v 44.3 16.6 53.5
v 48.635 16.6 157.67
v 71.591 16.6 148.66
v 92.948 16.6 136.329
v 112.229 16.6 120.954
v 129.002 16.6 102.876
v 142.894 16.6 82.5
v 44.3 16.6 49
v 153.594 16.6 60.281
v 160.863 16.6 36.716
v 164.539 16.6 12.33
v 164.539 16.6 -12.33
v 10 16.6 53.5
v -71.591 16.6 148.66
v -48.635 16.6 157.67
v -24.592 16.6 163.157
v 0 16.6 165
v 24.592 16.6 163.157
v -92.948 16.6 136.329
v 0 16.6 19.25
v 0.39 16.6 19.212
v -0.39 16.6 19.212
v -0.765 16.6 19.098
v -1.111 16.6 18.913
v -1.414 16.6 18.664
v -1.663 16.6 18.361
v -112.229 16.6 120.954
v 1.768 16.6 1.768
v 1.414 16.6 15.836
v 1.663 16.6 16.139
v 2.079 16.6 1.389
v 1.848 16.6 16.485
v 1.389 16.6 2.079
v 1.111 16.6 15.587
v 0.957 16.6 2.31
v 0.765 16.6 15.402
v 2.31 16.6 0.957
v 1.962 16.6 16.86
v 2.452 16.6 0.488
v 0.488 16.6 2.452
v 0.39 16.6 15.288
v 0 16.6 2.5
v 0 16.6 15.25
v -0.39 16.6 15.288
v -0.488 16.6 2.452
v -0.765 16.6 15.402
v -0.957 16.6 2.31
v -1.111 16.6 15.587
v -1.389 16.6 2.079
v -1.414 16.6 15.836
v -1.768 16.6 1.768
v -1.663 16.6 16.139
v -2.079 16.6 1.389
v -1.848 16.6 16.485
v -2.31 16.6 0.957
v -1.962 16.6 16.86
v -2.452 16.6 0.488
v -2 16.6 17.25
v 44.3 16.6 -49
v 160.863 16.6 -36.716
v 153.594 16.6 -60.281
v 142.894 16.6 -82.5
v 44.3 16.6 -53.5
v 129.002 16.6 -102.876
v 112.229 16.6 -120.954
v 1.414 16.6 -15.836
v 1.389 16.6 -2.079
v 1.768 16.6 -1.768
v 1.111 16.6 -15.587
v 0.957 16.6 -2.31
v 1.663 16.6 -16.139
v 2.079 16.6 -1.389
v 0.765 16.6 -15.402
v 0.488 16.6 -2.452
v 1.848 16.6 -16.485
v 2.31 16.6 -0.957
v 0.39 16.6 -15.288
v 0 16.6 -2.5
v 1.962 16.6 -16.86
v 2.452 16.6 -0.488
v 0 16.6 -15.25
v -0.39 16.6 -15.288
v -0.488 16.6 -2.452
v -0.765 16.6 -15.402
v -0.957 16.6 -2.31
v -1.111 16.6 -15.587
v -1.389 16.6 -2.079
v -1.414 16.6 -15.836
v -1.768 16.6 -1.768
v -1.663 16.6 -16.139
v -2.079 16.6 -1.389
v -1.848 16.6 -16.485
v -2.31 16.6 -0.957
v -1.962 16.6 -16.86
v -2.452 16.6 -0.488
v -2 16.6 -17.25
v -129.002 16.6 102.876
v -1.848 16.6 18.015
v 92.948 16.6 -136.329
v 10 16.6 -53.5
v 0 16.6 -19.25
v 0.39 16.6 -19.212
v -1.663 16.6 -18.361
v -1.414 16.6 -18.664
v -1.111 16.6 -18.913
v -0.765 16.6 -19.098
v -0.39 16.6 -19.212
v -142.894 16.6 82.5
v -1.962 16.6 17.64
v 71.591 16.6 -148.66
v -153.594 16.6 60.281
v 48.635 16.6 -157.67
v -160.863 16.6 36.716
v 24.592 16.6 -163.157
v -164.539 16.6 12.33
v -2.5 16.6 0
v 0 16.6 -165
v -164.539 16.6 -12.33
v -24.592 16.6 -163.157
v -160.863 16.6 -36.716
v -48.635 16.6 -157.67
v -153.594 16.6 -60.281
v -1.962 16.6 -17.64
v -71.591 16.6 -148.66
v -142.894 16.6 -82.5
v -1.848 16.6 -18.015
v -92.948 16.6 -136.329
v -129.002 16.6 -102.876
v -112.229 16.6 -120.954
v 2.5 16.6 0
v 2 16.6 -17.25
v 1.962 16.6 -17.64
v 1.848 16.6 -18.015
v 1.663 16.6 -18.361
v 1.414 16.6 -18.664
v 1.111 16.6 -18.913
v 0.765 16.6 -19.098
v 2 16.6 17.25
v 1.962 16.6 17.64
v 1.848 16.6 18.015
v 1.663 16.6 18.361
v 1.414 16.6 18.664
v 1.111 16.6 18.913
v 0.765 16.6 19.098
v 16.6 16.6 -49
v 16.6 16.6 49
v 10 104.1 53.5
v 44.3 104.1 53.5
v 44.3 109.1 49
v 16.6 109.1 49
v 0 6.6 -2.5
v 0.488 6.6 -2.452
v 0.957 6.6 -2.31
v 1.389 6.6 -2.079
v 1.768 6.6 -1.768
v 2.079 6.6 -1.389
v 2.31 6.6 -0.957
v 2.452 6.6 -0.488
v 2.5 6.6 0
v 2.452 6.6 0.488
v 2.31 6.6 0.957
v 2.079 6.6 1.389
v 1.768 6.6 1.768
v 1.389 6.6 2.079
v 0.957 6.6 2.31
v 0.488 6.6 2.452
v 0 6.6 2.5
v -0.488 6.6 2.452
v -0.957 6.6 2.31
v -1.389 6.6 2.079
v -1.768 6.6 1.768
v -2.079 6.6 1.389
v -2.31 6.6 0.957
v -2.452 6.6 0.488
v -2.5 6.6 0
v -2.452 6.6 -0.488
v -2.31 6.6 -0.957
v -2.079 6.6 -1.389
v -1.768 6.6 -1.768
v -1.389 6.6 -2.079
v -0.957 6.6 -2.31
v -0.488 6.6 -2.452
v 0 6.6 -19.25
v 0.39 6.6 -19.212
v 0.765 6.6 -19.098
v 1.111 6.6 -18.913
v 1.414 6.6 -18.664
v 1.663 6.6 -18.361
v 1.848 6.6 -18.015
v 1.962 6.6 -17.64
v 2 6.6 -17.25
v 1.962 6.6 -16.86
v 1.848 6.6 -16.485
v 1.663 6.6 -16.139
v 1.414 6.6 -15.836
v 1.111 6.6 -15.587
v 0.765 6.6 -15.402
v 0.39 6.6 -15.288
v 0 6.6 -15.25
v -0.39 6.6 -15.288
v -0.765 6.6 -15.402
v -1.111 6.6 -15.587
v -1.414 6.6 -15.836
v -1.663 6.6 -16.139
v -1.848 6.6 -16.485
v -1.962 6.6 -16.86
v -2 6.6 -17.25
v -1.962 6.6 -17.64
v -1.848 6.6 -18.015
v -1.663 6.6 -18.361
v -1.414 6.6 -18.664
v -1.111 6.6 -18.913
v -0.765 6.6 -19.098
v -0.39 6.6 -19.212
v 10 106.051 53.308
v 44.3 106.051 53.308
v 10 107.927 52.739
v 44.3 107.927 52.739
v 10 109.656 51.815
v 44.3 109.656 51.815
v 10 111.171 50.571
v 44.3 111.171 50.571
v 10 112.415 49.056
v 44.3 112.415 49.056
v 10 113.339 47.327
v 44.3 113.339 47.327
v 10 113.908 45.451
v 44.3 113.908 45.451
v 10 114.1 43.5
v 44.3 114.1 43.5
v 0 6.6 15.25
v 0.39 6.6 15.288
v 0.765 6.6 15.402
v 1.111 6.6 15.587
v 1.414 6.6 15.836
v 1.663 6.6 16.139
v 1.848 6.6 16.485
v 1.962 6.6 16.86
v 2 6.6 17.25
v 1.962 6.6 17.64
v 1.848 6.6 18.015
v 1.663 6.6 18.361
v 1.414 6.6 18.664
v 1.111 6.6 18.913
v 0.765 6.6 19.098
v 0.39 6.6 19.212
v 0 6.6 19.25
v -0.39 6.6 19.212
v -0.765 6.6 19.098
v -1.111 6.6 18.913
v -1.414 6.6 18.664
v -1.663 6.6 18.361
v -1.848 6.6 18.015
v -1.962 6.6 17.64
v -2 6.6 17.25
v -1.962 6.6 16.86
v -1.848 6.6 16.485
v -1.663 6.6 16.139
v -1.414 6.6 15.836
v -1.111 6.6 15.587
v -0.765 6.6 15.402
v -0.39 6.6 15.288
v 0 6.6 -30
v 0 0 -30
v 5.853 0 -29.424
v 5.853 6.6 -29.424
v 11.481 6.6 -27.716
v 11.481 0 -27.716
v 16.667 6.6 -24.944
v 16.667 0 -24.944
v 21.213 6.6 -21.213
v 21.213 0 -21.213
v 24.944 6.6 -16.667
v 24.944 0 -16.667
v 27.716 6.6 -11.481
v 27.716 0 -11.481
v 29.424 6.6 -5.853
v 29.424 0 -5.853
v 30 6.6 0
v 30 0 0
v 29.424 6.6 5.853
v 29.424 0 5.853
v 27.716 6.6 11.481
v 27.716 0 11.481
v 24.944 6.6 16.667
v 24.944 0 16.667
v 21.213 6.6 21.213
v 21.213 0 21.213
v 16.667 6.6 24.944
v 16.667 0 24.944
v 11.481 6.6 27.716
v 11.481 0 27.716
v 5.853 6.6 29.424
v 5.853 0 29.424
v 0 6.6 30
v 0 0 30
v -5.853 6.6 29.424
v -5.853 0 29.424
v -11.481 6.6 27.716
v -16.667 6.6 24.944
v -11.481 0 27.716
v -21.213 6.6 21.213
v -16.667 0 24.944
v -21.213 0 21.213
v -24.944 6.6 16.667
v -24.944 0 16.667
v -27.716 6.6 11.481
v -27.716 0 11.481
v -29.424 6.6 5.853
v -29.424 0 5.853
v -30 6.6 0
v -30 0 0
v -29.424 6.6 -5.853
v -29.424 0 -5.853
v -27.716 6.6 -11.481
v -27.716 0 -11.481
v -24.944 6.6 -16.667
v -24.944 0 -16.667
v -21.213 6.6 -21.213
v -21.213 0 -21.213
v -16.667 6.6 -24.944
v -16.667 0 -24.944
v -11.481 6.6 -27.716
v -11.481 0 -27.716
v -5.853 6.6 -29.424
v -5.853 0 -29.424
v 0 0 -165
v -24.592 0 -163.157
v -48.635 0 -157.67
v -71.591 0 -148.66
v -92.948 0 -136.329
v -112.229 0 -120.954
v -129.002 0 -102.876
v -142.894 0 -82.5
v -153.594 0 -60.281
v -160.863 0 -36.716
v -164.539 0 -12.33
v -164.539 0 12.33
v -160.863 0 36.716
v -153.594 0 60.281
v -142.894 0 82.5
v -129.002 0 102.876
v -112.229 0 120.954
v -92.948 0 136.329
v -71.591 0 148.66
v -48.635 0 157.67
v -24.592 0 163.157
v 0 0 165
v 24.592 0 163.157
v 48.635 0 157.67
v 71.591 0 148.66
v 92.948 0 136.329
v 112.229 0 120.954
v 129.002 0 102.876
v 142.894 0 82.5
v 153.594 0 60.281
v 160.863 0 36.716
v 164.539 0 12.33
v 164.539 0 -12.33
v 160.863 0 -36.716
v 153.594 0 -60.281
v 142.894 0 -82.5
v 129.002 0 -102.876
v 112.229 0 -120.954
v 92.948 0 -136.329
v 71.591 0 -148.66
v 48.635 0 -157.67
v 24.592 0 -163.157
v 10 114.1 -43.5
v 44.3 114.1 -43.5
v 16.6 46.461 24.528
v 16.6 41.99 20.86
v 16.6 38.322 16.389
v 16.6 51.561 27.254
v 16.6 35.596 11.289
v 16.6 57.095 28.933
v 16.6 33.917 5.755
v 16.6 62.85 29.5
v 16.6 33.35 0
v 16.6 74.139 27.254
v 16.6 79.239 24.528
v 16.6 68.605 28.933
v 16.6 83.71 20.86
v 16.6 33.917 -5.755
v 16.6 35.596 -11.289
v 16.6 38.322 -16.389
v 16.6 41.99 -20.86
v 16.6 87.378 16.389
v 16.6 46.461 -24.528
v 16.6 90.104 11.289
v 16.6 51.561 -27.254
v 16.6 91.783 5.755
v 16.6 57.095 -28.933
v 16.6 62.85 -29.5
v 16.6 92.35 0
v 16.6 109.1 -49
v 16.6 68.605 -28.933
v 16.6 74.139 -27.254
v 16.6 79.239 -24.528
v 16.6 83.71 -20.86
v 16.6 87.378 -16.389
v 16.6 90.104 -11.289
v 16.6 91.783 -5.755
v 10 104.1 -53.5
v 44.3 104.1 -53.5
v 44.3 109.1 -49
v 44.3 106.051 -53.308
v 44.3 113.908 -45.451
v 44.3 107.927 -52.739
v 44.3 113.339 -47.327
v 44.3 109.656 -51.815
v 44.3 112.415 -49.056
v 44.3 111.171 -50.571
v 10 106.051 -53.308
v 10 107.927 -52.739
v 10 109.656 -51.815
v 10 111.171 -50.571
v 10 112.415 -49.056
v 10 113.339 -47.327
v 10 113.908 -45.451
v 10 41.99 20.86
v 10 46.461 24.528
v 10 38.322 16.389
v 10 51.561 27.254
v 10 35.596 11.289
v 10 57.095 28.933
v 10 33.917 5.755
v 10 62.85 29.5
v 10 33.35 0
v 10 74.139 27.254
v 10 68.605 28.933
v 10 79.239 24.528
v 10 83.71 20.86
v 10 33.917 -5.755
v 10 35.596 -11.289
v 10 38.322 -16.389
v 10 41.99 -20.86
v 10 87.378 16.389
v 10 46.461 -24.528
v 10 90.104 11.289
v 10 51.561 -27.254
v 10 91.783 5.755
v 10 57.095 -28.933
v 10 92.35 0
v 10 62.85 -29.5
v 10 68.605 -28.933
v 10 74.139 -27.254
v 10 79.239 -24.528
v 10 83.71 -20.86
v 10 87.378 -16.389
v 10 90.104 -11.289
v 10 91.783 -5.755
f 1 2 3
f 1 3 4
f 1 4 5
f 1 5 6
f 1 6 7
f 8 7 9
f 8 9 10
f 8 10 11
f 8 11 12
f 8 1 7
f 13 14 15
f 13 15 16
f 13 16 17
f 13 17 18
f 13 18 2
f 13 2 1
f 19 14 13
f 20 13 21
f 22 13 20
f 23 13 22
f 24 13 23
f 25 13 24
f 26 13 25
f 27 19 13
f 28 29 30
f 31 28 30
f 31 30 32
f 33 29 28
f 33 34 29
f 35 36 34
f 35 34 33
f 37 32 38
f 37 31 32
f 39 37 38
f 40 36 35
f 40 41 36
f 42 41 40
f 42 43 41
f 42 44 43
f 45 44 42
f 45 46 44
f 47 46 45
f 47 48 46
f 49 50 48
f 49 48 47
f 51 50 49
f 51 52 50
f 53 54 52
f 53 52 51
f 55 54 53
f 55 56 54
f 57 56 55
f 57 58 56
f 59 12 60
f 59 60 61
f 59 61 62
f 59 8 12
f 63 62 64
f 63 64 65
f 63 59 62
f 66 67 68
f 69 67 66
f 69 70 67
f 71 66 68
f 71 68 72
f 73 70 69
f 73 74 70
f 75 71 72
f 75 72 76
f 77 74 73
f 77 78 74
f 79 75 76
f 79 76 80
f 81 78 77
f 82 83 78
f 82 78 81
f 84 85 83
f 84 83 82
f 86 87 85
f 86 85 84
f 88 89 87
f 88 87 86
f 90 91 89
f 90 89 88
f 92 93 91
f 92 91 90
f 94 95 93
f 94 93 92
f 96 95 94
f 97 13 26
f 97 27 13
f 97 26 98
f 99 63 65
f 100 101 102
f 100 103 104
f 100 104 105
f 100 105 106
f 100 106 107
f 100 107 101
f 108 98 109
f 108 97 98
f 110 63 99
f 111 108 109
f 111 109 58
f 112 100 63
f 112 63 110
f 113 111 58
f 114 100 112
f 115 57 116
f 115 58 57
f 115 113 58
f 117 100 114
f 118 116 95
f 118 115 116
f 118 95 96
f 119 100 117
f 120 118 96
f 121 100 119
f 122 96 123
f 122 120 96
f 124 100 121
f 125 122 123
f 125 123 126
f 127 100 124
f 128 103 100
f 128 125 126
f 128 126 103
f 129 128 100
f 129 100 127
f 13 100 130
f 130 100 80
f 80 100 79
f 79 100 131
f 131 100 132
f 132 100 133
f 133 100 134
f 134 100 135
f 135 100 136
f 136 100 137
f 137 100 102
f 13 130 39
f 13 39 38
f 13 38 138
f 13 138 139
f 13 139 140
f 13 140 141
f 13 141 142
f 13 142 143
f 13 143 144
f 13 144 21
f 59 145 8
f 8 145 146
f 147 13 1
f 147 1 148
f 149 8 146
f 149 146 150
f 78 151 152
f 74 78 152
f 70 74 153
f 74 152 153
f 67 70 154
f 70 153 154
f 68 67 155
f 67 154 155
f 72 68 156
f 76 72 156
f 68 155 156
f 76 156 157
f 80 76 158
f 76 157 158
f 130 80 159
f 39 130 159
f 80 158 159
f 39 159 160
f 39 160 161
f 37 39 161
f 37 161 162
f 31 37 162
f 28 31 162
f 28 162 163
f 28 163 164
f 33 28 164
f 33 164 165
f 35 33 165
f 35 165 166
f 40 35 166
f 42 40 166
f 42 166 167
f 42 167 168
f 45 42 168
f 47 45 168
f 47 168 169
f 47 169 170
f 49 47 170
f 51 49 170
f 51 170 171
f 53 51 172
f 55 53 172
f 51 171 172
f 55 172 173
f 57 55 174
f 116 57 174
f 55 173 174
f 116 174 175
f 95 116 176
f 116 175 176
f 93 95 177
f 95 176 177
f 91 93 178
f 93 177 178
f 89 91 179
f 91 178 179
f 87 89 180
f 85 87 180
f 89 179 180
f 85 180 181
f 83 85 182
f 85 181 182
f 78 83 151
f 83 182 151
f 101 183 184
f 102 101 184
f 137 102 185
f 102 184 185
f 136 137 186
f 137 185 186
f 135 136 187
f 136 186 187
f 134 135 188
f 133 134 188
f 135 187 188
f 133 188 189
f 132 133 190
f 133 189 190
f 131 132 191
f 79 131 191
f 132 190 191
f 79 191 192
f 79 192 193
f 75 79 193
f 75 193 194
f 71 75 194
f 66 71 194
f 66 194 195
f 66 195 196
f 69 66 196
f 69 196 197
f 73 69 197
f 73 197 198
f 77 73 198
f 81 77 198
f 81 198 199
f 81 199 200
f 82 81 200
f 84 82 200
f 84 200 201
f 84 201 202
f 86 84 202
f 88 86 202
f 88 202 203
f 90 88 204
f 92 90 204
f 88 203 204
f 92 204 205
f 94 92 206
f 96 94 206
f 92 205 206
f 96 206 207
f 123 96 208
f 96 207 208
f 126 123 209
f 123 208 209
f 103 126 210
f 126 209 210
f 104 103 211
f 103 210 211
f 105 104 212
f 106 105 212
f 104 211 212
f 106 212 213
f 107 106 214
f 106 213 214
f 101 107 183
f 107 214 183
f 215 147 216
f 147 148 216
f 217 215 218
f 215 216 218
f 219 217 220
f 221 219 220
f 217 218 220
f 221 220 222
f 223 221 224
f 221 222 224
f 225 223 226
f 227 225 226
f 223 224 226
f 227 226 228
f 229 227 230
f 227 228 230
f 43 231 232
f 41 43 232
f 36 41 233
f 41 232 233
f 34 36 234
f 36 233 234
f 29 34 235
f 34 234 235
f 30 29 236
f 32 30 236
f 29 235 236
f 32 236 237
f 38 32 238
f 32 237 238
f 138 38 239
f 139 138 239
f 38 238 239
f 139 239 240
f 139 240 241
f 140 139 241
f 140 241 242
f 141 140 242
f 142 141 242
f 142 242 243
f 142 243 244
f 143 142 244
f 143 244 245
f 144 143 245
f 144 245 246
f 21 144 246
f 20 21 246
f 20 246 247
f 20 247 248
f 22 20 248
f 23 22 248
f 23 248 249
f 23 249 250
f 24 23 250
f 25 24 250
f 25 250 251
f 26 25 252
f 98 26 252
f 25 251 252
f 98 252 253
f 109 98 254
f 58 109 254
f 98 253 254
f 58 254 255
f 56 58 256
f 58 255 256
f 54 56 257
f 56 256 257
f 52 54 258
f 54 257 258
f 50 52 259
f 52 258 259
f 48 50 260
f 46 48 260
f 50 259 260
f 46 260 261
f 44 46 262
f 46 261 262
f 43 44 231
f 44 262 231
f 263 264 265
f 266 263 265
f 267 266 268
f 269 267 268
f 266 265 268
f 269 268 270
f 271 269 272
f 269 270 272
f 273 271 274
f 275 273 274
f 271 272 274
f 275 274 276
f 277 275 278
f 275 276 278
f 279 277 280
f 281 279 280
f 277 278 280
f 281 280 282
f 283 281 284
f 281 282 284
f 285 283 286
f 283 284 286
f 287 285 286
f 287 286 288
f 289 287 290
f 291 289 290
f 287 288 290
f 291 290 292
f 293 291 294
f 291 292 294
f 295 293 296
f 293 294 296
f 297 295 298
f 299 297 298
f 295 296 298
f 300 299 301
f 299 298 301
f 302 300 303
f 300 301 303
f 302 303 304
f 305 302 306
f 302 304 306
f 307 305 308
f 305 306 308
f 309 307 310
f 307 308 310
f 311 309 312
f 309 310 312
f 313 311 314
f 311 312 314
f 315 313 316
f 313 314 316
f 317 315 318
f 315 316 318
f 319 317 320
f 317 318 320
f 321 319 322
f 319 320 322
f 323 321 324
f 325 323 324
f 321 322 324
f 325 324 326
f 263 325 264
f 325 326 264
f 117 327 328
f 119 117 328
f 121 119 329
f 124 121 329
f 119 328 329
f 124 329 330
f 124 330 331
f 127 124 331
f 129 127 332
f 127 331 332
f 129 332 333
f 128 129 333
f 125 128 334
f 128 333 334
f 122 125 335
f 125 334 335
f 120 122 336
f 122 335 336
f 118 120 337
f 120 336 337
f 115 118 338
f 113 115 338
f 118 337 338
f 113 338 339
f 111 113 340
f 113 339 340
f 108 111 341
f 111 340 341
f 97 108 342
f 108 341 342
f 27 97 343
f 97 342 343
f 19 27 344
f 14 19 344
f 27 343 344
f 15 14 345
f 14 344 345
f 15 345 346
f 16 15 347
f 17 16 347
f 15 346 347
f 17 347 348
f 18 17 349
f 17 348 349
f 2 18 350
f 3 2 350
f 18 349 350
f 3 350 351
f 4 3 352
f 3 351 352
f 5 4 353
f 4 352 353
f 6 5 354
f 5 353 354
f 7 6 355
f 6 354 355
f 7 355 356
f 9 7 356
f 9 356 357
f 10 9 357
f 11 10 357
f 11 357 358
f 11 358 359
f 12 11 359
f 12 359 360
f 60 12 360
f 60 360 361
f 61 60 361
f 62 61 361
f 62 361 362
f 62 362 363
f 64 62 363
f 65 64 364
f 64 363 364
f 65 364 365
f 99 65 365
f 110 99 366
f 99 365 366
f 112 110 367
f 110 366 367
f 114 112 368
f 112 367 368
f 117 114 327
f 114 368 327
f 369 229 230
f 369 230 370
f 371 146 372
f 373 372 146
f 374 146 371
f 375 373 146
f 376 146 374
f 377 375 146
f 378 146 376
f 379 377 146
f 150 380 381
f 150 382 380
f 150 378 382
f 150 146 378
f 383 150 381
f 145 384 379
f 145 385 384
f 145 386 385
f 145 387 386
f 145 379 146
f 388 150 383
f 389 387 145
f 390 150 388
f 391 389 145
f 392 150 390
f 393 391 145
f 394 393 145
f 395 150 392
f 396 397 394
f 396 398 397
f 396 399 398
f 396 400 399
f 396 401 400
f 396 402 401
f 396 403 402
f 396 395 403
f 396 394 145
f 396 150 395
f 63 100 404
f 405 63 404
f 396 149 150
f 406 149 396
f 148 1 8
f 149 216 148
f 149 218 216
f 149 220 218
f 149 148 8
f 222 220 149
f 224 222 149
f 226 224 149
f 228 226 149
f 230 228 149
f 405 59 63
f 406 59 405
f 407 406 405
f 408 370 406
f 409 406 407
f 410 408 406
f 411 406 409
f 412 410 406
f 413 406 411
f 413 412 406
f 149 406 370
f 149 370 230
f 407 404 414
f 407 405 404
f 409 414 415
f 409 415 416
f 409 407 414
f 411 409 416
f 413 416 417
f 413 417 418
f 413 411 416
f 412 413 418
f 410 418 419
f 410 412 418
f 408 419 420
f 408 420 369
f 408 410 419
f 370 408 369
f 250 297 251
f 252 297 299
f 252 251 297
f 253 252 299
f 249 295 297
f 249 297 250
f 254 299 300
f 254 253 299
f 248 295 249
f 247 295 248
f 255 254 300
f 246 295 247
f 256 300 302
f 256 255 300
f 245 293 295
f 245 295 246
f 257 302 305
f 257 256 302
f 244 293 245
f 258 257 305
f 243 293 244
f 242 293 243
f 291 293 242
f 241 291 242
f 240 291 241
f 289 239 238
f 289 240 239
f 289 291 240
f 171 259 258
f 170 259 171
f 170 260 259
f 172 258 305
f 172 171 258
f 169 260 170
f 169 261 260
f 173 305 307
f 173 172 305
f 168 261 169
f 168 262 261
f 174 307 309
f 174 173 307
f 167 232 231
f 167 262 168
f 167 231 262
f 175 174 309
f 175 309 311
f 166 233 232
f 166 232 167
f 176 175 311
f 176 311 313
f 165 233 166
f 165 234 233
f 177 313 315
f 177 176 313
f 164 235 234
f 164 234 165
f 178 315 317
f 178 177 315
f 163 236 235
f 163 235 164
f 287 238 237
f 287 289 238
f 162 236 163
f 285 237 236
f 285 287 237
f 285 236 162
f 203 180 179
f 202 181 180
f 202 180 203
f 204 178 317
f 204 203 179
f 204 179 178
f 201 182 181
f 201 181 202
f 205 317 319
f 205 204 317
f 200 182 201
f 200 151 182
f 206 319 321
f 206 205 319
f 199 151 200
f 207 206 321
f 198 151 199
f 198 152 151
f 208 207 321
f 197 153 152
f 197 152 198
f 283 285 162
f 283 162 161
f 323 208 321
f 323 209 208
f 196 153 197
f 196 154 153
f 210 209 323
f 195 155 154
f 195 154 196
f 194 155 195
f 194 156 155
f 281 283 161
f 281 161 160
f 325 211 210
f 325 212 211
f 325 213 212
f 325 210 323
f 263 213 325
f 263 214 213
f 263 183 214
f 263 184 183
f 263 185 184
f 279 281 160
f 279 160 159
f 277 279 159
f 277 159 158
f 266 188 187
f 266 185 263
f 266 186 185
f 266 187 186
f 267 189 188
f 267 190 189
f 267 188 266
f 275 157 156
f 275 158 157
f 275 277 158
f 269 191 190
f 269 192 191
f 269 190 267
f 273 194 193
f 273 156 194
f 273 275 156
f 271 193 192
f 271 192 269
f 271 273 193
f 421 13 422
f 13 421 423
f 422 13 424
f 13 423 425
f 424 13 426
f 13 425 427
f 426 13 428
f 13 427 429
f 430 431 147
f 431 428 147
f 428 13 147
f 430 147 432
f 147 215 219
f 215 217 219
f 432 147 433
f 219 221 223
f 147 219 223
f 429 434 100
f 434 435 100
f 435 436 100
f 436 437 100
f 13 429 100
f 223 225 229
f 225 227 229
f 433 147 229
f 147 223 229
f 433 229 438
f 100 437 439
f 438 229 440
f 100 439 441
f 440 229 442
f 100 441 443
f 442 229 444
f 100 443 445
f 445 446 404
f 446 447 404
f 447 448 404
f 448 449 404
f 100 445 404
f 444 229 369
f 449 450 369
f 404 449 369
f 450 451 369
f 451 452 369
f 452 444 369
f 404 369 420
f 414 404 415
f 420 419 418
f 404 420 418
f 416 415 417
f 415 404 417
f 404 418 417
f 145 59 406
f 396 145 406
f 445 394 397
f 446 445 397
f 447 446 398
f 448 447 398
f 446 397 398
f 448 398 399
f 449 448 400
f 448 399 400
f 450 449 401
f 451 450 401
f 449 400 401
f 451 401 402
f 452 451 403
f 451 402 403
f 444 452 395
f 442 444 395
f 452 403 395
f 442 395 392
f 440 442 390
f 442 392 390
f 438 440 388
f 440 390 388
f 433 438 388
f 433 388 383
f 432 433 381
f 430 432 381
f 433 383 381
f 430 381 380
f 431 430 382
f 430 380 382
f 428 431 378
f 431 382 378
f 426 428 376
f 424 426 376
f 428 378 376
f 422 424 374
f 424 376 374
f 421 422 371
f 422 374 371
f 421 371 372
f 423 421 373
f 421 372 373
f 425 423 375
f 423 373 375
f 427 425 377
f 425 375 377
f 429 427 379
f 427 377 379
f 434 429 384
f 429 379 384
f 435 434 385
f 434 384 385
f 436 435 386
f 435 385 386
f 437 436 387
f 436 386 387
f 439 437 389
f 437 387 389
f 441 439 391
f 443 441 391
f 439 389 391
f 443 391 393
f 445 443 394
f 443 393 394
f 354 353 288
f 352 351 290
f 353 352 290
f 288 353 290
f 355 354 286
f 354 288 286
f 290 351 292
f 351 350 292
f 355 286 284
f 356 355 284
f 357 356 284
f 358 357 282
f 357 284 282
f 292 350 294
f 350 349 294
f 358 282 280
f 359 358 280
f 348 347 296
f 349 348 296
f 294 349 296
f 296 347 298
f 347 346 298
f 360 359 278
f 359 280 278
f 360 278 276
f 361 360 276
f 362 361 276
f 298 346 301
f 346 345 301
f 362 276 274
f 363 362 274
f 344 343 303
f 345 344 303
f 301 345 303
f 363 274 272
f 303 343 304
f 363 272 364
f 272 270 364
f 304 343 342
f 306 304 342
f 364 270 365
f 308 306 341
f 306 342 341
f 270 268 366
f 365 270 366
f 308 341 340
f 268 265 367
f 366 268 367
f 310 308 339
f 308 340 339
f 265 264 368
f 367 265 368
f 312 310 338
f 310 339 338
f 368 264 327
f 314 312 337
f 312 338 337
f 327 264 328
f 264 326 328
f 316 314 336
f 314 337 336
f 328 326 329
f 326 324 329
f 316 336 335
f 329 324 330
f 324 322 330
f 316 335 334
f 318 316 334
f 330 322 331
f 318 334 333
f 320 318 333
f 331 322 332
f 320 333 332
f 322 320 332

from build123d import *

# Parameters (mm, degrees)
SKETCH_1_R          = 165
EXTRUDE_1_DEPTH     = 16.6
SKETCH_2_R          = 30
CUT_EXTRUDE_1_DEPTH = 6.6
SKETCH_3_R          = 2.5
SKETCH_3_R_2        = 2
CUT_EXTRUDE_2_DEPTH = 234.559414283
SKETCH_4_W          = 107
SKETCH_4_H          = 97.5
EXTRUDE_2_DEPTH     = 34.3
SKETCH_5_W          = 98
SKETCH_5_H          = 92.5
CUT_EXTRUDE_3_DEPTH = 27.7
SKETCH_6_R          = 29.5
CUT_EXTRUDE_4_DEPTH = 6.6
FILLET_1_R          = 10


with BuildPart() as part:
    # 草图1 → 凸台-拉伸1 (new body)
    with BuildSketch(Plane(origin=(0, 0, 0), x_dir=(1, 0, 0), z_dir=(0, 1, 0))):
        with Locations(Location((0, 0, 0), (0, 0, 90))):
            Circle(SKETCH_1_R)
    extrude(amount=EXTRUDE_1_DEPTH)

    # 草图2 → 切除-拉伸1 (cut)
    with BuildSketch(Plane.XZ):
        with Locations(Location((0, 0, 0), (0, 0, 270))):
            Circle(SKETCH_2_R)
    extrude(amount=-CUT_EXTRUDE_1_DEPTH, mode=Mode.SUBTRACT)

    # 草图3 → 切除-拉伸2 (cut, through all)
    with BuildSketch(Plane.XZ.offset(-6.6)):
        with Locations(Location((0, 0, 0), (0, 0, 270))):
            Circle(SKETCH_3_R)
        with Locations(Location((0, 17.25, 0), (0, 0, 270))):
            Circle(SKETCH_3_R_2)
        with Locations(Location((0, -17.25, 0), (0, 0, 270))):
            Circle(SKETCH_3_R_2)
    extrude(amount=-CUT_EXTRUDE_2_DEPTH, mode=Mode.SUBTRACT)

    # 草图4 → 凸台-拉伸2 (add)
    with BuildSketch(Plane(origin=(10, 0, 0), x_dir=(0, 0, -1), z_dir=(1, 0, 0))):
        with Locations((0, 65.35)):
            Rectangle(SKETCH_4_W, SKETCH_4_H)
    extrude(amount=EXTRUDE_2_DEPTH)

    # 草图5 → 切除-拉伸3 (cut)
    with BuildSketch(Plane(origin=(44.3, 0, 0), x_dir=(0, 0, -1), z_dir=(1, 0, 0))):
        with Locations((0, 62.85)):
            Rectangle(SKETCH_5_W, SKETCH_5_H)
    extrude(amount=-CUT_EXTRUDE_3_DEPTH, mode=Mode.SUBTRACT)

    # 草图6 → 切除-拉伸4 (cut)
    with BuildSketch(Plane(origin=(16.6, 0, 0), x_dir=(0, 0, -1), z_dir=(1, 0, 0))):
        with Locations((0, 62.85)):
            Circle(SKETCH_6_R)
    extrude(amount=-CUT_EXTRUDE_4_DEPTH, mode=Mode.SUBTRACT)

    # 圆角1
    fillet_1_edges = [part.edges().sort_by_distance(p)[0] for p in [
        (27.15, 114.1, 53.5),
        (27.15, 114.1, -53.5),
    ]]
    fillet(fillet_1_edges, radius=FILLET_1_R)


solid = part.part
